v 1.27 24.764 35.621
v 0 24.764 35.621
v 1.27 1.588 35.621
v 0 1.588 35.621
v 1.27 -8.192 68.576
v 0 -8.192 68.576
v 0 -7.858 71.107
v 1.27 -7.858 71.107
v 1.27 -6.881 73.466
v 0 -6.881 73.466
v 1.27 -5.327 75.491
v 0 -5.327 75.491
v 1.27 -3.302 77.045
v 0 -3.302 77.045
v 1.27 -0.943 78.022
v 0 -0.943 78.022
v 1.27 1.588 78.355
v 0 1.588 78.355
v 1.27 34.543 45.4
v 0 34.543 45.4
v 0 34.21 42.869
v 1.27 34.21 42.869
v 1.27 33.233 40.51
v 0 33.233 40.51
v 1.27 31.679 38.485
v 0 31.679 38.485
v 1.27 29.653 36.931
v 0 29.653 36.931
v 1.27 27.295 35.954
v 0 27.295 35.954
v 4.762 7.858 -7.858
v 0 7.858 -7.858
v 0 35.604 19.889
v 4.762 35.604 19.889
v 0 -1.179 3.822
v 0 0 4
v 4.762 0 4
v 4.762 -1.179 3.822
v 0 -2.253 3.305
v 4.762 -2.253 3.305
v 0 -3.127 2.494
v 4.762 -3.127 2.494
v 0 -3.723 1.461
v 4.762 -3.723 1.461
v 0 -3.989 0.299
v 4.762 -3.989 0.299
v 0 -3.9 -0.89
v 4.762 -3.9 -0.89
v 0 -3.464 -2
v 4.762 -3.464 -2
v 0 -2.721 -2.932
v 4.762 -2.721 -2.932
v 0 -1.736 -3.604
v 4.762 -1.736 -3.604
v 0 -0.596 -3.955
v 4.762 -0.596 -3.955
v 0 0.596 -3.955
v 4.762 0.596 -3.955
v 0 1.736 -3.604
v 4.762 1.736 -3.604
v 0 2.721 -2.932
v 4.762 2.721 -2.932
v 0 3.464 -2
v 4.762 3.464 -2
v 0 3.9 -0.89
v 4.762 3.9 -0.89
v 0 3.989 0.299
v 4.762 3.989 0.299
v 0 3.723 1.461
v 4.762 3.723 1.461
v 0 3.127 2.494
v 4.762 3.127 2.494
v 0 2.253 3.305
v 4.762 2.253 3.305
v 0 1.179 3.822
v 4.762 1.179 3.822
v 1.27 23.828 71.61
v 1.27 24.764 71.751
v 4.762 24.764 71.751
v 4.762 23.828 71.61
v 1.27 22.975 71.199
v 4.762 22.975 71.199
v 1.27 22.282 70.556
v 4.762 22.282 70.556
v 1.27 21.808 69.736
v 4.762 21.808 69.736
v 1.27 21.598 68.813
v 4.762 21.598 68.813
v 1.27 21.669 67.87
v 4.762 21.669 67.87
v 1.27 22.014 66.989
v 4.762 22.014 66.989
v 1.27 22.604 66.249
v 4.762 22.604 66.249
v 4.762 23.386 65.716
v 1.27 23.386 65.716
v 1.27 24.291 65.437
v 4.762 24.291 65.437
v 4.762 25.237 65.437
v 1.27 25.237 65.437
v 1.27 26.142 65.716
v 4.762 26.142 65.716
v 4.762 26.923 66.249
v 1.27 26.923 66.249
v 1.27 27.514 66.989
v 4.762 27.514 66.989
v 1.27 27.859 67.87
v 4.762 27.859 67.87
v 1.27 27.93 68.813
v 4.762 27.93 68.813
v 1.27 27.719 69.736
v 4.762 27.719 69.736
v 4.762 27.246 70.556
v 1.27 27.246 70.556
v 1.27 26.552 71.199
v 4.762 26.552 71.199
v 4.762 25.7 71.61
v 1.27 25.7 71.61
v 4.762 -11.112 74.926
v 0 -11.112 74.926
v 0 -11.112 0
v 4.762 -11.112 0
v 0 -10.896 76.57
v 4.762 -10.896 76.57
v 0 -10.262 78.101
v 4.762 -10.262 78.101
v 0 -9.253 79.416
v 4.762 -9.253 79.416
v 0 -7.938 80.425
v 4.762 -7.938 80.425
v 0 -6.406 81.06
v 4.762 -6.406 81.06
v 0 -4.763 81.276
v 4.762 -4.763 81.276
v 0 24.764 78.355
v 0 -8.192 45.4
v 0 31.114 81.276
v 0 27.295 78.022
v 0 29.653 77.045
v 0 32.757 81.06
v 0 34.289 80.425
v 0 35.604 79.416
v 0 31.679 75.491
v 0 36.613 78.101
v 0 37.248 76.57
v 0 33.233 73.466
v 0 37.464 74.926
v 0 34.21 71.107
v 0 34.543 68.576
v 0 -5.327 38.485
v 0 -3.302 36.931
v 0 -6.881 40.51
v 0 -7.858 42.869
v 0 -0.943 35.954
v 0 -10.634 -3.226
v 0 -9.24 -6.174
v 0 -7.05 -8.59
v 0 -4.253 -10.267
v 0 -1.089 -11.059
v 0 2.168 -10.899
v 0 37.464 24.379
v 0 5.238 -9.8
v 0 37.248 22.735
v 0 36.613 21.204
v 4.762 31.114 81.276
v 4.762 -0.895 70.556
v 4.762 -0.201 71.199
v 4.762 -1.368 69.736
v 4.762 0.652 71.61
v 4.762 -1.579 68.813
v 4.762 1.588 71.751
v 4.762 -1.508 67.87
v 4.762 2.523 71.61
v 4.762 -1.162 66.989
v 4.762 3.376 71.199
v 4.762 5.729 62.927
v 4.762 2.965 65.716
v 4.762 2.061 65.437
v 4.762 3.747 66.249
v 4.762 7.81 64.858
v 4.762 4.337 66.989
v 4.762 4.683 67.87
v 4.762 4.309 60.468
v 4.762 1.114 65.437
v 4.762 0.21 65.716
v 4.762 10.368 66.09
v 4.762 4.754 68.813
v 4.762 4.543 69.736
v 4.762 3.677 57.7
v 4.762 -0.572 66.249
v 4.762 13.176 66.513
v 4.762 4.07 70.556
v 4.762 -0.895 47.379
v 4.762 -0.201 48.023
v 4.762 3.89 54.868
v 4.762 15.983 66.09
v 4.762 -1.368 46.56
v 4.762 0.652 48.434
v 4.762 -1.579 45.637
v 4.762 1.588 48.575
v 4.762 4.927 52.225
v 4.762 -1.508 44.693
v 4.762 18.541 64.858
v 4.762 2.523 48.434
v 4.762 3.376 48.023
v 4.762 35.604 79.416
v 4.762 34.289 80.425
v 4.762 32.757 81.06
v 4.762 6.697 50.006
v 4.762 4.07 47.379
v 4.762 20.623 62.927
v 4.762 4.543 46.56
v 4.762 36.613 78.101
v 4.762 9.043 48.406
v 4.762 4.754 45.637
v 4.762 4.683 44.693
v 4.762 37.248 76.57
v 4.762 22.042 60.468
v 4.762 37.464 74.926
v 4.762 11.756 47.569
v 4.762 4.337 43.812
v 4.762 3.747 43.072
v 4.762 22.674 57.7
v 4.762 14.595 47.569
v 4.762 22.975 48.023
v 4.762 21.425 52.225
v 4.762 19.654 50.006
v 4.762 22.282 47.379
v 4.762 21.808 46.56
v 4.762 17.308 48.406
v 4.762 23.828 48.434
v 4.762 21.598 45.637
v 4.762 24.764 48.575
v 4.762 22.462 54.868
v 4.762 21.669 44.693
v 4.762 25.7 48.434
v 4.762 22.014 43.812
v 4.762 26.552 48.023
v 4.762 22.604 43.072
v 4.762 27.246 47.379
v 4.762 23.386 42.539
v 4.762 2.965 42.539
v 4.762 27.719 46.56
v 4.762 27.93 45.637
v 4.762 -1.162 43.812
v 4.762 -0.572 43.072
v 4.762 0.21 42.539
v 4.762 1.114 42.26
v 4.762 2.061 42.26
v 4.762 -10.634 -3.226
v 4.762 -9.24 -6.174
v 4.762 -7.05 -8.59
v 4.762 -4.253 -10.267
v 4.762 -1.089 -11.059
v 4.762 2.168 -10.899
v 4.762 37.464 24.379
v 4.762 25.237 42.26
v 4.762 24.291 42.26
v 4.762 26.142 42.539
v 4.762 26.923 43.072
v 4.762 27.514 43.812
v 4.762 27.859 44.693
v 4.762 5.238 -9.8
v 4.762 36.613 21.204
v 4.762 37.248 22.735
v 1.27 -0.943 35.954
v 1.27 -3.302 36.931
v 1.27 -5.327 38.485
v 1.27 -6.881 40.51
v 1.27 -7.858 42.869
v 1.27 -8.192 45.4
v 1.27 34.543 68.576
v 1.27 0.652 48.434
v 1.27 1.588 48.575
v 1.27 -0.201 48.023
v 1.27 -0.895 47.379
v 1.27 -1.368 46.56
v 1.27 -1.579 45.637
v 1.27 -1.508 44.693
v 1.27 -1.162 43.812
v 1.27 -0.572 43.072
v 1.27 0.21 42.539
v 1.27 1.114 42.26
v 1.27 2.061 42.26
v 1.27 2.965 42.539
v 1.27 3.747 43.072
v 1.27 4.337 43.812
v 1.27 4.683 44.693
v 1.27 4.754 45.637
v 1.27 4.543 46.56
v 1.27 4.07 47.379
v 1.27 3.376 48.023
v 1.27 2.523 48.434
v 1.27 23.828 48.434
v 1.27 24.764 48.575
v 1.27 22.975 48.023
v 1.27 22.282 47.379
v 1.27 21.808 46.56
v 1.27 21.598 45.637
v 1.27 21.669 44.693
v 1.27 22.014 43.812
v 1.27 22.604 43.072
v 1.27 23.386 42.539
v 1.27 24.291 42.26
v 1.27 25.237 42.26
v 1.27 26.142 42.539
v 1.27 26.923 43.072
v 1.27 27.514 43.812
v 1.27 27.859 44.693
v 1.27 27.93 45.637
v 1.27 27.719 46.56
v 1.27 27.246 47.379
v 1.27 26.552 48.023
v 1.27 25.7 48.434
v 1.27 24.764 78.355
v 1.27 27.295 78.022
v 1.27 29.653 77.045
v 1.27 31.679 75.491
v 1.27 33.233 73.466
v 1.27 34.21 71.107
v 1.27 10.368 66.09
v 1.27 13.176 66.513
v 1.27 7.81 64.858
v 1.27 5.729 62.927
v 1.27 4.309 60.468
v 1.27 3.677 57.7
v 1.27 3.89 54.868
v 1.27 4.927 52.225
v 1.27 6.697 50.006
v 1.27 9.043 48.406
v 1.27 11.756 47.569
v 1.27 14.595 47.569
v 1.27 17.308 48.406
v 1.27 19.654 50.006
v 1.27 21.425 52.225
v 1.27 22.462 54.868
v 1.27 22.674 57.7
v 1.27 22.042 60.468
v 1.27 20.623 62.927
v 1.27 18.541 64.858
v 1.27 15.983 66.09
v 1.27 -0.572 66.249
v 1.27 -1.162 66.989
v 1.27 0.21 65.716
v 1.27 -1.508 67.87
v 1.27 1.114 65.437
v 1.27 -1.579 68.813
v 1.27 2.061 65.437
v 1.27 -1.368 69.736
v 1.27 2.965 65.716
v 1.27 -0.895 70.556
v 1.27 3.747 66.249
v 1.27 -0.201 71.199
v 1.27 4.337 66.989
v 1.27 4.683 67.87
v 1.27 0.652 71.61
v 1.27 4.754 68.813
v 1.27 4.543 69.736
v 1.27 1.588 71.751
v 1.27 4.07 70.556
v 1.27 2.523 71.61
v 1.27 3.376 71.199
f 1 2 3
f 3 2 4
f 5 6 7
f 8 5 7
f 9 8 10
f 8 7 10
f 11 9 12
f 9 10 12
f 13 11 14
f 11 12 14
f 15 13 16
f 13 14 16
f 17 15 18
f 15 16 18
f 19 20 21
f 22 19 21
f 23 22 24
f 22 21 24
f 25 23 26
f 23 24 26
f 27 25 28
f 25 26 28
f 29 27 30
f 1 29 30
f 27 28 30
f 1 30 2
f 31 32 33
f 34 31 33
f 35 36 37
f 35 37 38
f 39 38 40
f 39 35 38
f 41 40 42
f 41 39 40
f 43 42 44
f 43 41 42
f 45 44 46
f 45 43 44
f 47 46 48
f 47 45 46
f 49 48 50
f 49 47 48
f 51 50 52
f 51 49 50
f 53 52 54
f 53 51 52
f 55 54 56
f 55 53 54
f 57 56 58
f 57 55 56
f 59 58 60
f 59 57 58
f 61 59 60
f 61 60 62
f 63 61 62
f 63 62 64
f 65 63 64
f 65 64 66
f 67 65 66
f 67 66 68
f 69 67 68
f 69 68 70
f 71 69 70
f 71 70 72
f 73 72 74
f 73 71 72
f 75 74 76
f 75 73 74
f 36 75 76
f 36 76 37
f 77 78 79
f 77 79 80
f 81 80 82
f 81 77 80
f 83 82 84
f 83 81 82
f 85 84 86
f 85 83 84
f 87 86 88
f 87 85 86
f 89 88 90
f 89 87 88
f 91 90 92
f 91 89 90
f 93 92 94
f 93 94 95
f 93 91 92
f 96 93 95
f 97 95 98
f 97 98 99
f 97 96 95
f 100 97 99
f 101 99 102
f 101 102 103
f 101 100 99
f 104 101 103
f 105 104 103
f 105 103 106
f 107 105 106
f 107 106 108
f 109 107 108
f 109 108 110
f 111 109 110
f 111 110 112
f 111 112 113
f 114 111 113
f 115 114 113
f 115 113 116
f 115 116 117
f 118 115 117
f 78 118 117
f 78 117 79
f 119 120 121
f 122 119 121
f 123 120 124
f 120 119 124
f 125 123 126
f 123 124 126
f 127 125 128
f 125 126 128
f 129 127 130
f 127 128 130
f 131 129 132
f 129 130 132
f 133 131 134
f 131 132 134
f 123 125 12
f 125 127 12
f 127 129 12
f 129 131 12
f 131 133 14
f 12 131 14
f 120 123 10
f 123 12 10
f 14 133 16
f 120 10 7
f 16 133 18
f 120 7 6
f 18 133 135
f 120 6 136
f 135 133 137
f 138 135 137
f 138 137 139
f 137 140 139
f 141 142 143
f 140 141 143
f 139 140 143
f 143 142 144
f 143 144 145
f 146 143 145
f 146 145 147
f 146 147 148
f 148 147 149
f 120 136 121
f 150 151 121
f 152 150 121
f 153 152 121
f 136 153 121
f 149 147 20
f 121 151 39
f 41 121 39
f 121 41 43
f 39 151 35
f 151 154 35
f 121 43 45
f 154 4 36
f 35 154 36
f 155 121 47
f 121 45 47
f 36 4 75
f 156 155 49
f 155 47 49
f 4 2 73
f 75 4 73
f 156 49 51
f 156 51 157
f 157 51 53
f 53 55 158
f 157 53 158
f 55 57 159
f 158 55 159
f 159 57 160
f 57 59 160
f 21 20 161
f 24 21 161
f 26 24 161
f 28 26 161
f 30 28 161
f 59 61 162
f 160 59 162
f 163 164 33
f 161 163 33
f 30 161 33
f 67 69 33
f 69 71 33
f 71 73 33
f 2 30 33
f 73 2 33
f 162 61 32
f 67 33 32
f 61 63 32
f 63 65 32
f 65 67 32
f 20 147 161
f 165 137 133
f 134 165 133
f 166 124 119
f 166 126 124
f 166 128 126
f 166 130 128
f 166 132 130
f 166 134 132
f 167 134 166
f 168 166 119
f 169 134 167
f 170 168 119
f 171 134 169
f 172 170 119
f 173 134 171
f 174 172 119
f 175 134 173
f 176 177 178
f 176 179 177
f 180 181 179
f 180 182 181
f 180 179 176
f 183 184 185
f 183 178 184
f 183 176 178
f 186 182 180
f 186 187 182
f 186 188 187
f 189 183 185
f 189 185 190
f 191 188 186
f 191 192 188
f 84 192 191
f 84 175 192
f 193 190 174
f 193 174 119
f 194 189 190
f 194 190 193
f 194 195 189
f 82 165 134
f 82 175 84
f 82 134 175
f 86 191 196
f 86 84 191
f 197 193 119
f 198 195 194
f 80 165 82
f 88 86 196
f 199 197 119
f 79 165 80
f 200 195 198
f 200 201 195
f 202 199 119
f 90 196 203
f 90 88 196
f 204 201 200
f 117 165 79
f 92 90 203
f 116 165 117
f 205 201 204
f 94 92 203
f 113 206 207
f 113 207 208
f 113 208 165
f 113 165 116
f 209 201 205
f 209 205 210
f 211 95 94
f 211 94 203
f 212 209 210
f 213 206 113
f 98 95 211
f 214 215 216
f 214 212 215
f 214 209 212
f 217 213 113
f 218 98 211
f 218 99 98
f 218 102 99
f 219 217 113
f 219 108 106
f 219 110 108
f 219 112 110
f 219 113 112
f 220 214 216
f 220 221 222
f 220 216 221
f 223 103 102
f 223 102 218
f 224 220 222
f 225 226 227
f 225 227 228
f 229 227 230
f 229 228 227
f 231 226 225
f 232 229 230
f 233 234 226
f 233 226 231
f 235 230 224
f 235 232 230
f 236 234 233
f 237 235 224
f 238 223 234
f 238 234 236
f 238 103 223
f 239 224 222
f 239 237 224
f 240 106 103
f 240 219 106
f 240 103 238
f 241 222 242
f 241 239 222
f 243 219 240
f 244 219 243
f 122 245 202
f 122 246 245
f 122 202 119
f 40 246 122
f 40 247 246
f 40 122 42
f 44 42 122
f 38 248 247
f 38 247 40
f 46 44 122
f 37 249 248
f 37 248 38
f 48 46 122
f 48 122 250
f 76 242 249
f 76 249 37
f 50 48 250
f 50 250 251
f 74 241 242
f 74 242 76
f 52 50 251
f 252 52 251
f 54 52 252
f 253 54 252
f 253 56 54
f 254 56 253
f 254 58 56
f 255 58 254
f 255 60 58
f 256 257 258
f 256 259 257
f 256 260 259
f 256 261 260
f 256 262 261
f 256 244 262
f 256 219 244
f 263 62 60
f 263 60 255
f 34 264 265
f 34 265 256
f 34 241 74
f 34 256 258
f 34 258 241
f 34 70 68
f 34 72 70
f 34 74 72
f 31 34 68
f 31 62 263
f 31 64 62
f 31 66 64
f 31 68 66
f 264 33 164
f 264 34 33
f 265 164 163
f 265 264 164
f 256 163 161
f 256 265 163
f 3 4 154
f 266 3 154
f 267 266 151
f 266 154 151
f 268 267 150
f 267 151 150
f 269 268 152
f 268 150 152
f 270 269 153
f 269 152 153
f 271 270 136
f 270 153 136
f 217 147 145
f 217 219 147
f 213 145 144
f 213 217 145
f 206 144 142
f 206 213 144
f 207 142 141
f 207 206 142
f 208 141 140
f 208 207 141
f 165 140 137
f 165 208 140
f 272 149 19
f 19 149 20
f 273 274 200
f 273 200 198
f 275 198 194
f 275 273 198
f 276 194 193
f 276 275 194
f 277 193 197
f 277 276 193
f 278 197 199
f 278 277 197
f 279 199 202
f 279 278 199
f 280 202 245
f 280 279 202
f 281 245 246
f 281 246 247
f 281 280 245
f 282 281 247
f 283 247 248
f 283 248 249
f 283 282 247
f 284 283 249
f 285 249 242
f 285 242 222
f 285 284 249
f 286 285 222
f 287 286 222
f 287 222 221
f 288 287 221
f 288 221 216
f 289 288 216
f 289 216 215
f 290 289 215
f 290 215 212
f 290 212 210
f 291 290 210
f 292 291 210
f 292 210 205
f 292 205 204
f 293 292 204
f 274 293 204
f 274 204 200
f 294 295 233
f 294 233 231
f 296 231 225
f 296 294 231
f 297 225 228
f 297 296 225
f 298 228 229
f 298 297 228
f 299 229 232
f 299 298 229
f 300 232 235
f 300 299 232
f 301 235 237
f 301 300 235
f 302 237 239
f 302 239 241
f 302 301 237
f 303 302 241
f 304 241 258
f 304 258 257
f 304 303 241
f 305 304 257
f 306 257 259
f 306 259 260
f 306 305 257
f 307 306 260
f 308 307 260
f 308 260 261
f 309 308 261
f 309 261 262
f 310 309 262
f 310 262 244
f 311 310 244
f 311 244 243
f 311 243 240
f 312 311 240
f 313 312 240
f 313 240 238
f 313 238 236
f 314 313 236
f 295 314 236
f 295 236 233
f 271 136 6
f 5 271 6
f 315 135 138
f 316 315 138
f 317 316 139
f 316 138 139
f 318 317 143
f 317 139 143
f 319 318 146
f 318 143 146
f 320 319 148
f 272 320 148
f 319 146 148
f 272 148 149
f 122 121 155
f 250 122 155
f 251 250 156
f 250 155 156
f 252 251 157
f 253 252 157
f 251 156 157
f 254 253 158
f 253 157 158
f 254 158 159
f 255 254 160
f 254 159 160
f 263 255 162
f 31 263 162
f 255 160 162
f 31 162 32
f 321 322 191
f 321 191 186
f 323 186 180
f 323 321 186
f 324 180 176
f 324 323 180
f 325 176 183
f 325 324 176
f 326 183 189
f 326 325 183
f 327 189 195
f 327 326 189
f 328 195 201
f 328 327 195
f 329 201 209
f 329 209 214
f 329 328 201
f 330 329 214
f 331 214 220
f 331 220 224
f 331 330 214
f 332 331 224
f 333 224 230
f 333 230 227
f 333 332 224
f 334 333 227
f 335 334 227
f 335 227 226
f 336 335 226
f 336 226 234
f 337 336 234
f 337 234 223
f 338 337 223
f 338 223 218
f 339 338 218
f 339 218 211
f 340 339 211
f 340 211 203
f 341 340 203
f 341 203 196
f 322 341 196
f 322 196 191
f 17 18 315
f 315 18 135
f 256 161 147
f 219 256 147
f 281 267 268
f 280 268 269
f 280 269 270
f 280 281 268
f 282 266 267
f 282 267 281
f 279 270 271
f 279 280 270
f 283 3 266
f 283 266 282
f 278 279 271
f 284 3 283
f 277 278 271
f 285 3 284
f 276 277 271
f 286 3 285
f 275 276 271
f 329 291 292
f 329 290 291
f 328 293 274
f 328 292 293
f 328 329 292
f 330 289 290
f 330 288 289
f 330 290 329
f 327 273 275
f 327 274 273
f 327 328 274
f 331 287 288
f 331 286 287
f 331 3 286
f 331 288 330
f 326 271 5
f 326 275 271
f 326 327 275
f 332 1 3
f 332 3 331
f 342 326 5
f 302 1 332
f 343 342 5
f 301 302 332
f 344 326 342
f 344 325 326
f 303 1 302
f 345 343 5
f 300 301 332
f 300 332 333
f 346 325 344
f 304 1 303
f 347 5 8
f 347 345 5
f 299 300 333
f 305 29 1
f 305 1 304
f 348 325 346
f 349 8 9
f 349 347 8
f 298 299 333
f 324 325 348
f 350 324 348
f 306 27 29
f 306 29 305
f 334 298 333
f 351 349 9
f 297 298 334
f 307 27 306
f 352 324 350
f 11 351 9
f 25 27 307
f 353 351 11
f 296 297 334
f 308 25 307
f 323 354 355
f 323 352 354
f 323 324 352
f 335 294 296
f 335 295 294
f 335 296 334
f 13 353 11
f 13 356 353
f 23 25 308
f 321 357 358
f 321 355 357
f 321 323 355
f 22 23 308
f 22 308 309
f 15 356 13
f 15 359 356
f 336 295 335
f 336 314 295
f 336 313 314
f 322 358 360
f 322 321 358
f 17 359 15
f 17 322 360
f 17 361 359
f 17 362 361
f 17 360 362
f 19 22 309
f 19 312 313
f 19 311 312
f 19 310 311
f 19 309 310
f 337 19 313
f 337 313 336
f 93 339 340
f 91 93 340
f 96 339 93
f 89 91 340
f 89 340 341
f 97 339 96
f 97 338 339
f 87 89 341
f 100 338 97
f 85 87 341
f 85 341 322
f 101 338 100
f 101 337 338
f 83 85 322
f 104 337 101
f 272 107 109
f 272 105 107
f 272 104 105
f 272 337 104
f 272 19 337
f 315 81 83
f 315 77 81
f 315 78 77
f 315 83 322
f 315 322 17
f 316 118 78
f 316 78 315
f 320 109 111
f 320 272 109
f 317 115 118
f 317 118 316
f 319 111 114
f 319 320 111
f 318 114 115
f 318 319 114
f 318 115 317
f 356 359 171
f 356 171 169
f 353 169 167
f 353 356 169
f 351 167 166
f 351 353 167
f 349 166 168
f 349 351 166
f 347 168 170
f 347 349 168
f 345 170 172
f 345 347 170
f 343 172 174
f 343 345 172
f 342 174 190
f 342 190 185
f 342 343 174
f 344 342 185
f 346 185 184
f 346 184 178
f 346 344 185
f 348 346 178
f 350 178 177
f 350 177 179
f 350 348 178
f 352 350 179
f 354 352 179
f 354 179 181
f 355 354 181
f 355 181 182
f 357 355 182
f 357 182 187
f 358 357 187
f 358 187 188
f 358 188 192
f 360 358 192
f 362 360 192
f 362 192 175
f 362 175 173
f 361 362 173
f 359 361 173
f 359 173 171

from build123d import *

# Parameters (mm, degrees)
SKETCH1_R           = 4.000000001
SKETCH1_R_2         = 3.175
SKETCH1_R_3         = 9.525
BOSS_EXTRUDE1_DEPTH = 4.7625
FILLET1_R           = 6.35
CUT_EXTRUDE4_DEPTH  = 1.27


with BuildPart() as part:
    # Sketch1 → Boss-Extrude1 (new body)
    with BuildSketch(Plane(origin=(0, 0, 0), x_dir=(0, 0, -1), z_dir=(1, 0, 0))):
        with BuildLine():
            Line((7.857724106, 7.857724106), (-21.748484988, 37.4639332))
            Line((-21.748484988, 37.4639332), (-81.276178769, 37.4639332))
            Line((-81.276178769, 37.4639332), (-81.276178769, -11.1125))
            Line((-81.276178769, -11.1125), (0, -11.1125))
            ThreePointArc((0, -11.1125), (10.266611305, -4.252569642), (7.857724106, 7.857724106))
        make_face()
        Circle(SKETCH1_R, mode=Mode.SUBTRACT)
        with Locations((-68.576178769, 24.7639332)):
            Circle(SKETCH1_R_2, mode=Mode.SUBTRACT)
        with Locations((-45.399745569, 24.7639332)):
            Circle(SKETCH1_R_2, mode=Mode.SUBTRACT)
        with Locations((-45.399745569, 1.5875)):
            Circle(SKETCH1_R_2, mode=Mode.SUBTRACT)
        with Locations((-68.576178769, 1.5875)):
            Circle(SKETCH1_R_2, mode=Mode.SUBTRACT)
        with Locations((-56.987962169, 13.1757166)):
            Circle(SKETCH1_R_3, mode=Mode.SUBTRACT)
    extrude(amount=BOSS_EXTRUDE1_DEPTH)

    # Fillet1
    fillet1_edges = [part.edges().sort_by_distance(p)[0] for p in [
        (2.38125, -11.1125, 81.276178769),
        (2.38125, 37.4639332, 21.748484988),
        (2.38125, 37.4639332, 81.276178769),
    ]]
    fillet(fillet1_edges, radius=FILLET1_R)

    # Sketch5 → Cut-Extrude4 (cut)
    with BuildSketch(Plane.ZY):
        with BuildLine():
            Line((35.620745569, 24.7639332), (35.620745569, 1.5875))
            ThreePointArc((35.620745569, 1.5875), (38.484948356, -5.327297213), (45.399745569, -8.1915))
            Line((45.399745569, -8.1915), (68.576178769, -8.1915))
            ThreePointArc((68.576178769, -8.1915), (75.490975982, -5.327297213), (78.355178769, 1.5875))
            Line((78.355178769, 1.5875), (78.355178769, 24.7639332))
            ThreePointArc((78.355178769, 24.7639332), (75.490975982, 31.678730413), (68.576178769, 34.5429332))
            Line((68.576178769, 34.5429332), (45.399745569, 34.5429332))
            ThreePointArc((45.399745569, 34.5429332), (38.484948356, 31.678730413), (35.620745569, 24.7639332))
        make_face()
    extrude(amount=-CUT_EXTRUDE4_DEPTH, mode=Mode.SUBTRACT)


solid = part.part
